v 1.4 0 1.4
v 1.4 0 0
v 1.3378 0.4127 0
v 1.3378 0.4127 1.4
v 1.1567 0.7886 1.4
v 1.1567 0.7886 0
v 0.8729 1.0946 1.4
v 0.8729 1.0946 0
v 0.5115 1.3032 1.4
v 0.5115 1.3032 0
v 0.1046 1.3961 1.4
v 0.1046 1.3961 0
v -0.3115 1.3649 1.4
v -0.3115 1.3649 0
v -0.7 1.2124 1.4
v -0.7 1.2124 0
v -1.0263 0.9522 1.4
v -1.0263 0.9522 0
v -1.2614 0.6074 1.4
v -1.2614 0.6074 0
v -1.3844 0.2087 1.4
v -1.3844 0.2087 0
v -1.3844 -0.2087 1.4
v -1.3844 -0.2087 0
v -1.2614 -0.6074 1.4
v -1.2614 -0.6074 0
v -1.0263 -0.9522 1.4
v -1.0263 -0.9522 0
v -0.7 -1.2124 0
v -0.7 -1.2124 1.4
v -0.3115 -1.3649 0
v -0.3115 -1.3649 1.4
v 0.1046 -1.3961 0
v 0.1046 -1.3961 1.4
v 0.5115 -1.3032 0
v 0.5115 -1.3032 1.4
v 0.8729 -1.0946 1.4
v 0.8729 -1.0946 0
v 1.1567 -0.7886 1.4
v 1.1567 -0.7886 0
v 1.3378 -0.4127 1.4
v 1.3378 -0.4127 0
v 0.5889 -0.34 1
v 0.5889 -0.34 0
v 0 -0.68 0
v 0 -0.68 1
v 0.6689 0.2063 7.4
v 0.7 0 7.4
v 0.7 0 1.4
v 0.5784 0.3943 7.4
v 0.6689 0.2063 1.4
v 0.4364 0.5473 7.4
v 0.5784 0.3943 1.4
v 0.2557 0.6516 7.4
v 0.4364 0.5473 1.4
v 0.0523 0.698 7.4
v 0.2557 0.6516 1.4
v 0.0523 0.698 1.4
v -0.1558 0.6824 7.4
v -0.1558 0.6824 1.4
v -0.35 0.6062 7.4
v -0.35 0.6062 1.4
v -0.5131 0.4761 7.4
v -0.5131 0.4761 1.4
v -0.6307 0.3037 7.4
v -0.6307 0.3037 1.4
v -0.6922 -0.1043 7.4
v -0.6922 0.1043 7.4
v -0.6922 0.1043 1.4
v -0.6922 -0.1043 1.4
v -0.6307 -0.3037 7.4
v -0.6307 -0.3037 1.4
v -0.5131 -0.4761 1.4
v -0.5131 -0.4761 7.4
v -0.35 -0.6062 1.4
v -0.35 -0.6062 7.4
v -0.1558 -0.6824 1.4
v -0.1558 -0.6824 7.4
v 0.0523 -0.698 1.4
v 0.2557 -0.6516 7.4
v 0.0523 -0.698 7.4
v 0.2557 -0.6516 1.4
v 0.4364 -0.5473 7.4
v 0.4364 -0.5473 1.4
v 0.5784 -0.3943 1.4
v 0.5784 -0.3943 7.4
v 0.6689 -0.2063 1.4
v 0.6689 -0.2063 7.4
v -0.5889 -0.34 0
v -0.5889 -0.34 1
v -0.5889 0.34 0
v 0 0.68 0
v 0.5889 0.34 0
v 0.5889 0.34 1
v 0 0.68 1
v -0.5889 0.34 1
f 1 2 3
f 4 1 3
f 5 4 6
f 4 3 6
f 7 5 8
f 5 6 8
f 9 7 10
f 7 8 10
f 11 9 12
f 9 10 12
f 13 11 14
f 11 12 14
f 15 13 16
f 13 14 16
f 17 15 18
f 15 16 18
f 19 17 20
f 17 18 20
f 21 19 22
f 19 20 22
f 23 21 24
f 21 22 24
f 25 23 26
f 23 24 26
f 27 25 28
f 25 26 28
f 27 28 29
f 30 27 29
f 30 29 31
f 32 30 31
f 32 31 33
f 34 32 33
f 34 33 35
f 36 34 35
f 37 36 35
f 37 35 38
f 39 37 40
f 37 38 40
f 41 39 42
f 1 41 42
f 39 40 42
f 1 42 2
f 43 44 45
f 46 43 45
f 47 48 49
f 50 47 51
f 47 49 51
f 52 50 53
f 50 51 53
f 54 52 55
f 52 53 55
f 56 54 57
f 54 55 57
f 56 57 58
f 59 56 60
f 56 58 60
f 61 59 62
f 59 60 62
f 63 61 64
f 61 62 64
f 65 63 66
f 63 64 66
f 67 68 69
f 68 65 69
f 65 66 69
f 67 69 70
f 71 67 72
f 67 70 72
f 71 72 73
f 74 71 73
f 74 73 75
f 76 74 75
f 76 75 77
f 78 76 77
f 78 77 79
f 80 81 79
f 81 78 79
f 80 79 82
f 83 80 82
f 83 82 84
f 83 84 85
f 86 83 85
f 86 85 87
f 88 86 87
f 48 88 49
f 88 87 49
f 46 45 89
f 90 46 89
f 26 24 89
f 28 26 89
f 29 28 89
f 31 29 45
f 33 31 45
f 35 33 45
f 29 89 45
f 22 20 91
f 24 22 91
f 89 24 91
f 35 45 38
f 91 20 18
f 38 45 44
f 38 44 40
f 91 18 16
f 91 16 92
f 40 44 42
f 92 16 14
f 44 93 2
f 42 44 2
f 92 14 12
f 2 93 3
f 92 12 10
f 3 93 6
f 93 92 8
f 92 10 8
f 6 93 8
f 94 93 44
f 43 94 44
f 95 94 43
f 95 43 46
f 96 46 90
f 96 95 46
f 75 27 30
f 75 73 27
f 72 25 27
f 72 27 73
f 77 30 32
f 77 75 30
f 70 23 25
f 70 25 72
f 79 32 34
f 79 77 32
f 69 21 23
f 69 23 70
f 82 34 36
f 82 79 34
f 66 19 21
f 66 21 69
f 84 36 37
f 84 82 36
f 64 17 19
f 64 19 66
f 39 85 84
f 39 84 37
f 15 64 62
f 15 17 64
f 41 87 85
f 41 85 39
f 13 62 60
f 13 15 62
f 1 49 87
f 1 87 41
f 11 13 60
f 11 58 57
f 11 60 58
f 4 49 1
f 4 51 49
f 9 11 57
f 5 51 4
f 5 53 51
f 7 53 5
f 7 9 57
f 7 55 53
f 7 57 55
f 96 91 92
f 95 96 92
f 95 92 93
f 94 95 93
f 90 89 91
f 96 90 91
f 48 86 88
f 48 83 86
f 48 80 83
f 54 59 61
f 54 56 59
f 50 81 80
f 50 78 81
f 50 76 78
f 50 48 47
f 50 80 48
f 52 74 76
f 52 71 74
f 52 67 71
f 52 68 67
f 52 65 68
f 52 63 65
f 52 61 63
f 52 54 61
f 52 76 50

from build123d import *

# Parameters (mm, degrees)
SKETCH_1_R          = 1.4
EXTRUDE_1_DEPTH     = 1.4
SKETCH_2_R          = 0.7
EXTRUDE_2_DEPTH     = 10
CUT_EXTRUDE_1_DEPTH = 1
SKETCH_4_R          = 2.875018911
CUT_EXTRUDE_2_DEPTH = 4


with BuildPart() as part:
    # 草图1 → 凸台-拉伸1 (new body)
    with BuildSketch(Plane.XY):
        Circle(SKETCH_1_R)
    extrude(amount=EXTRUDE_1_DEPTH)

    # 草图2 → 凸台-拉伸2 (add)
    with BuildSketch(Plane.XY.offset(1.4)):
        Circle(SKETCH_2_R)
    extrude(amount=EXTRUDE_2_DEPTH)

    # 草图3 → 切除-拉伸1 (cut)
    with BuildSketch(Plane(origin=(0, 0, 0), x_dir=(-1, 0, 0), z_dir=(0, 0, -1))):
        Polygon((0, 0.68), (-0.588897275, 0.34), (-0.588897275, -0.34), (0, -0.68), (0.588897275, -0.34), (0.588897275, 0.34), align=None)
    extrude(amount=-CUT_EXTRUDE_1_DEPTH, mode=Mode.SUBTRACT)

    # 草图4 → 切除-拉伸2 (cut)
    with BuildSketch(Plane.XY.offset(11.4)):
        Circle(SKETCH_4_R)
    extrude(amount=-CUT_EXTRUDE_2_DEPTH, mode=Mode.SUBTRACT)


solid = part.part
